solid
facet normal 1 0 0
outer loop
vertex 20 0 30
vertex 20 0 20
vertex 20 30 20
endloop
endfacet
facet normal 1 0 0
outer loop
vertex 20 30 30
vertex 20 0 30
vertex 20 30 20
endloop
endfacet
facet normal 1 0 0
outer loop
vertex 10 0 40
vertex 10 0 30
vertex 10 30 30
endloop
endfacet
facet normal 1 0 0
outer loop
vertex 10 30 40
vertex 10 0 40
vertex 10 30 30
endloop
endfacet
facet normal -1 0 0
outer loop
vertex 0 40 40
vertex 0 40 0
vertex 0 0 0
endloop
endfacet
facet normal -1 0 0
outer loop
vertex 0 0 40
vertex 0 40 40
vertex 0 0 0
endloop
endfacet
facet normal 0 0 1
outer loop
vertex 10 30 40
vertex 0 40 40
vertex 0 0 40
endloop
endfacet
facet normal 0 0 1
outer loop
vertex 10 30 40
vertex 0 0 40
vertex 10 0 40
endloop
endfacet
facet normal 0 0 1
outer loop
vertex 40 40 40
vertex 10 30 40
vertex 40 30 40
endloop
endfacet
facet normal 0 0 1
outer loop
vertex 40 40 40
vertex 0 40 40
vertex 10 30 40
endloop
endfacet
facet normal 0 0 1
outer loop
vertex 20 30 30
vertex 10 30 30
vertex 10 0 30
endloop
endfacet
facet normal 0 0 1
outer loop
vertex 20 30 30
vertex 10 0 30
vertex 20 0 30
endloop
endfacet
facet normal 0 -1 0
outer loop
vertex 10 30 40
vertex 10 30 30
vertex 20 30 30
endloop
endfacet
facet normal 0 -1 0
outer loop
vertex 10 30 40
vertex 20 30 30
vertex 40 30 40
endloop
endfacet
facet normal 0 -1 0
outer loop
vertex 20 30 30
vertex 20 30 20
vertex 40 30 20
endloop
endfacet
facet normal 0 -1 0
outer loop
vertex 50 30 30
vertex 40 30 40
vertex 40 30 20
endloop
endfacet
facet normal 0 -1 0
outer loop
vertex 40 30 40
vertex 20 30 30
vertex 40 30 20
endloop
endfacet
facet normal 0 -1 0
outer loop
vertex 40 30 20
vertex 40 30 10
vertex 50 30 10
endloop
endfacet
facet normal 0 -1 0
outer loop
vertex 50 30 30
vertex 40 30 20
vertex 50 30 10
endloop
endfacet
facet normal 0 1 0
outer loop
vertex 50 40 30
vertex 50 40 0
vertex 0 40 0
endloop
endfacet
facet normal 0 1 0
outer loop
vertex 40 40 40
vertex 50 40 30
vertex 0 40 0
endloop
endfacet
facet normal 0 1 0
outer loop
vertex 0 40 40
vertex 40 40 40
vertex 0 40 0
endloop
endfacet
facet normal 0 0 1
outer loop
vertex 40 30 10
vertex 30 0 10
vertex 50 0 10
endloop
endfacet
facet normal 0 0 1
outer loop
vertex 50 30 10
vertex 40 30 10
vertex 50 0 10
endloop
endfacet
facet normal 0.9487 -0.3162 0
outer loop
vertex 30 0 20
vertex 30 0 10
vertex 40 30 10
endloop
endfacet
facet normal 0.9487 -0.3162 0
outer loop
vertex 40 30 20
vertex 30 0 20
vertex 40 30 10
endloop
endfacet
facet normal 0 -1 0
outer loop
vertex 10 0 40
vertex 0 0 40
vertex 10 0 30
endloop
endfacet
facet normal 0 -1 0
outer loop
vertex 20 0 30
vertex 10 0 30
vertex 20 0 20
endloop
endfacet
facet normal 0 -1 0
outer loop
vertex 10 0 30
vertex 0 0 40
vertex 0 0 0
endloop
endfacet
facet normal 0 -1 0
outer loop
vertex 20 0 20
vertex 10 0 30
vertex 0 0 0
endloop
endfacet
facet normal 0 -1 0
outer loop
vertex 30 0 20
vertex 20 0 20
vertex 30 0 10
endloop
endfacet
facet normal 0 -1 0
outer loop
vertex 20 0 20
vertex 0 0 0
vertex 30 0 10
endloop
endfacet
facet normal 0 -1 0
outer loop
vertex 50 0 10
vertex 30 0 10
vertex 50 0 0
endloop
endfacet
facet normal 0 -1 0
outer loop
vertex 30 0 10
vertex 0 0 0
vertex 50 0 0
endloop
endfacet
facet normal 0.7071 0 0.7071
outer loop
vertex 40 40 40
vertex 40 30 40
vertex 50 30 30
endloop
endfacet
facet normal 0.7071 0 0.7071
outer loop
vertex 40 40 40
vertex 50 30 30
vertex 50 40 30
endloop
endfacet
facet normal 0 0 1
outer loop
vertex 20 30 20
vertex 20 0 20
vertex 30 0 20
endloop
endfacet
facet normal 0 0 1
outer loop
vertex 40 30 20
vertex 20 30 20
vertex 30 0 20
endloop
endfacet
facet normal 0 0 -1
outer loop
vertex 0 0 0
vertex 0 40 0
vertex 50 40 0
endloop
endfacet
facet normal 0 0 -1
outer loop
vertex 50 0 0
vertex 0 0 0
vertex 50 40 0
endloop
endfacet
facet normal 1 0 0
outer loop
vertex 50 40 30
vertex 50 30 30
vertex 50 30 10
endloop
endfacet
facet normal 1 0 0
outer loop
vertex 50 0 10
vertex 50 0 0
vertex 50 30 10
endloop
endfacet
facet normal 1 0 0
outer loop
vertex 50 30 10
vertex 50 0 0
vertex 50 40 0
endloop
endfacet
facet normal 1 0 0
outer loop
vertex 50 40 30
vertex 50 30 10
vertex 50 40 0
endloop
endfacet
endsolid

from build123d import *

# Parameters (mm, degrees)
F1_DEPTH = 40
F0_W     = 10
F0_H     = 30
F2_DEPTH = 30
F3_DEPTH = 20
F4_DEPTH = 10
F5_SIZE  = 10


with BuildPart() as f1:
    # F0 (on Top) → F1 (new body)
    with BuildSketch(Plane.XY):
        Polygon((0, 40), (0, 0), (10, 0), (10, 30), (20, 30), (40, 30), (50, 30), (50, 40), align=None)
    extrude(amount=F1_DEPTH)

    # F0 (on Top) → F2 (join)
    with BuildSketch(Plane.XY):
        with Locations((15, 15)):
            Rectangle(F0_W, F0_H)
    extrude(amount=F2_DEPTH)

    # F0 (on Top) → F3 (join)
    with BuildSketch(Plane.XY):
        Polygon((20, 30), (20, 0), (30, 0), (40, 30), align=None)
    extrude(amount=F3_DEPTH)

    # F0 (on Top) → F4 (join)
    with BuildSketch(Plane.XY):
        Polygon((40, 30), (30, 0), (50, 0), (50, 30), align=None)
    extrude(amount=F4_DEPTH)

    # F5
    f5_edges = [f1.edges().sort_by_distance(p)[0] for p in [
        (50, 35, 40),
    ]]
    chamfer(f5_edges, length=F5_SIZE)


solid = f1.part
